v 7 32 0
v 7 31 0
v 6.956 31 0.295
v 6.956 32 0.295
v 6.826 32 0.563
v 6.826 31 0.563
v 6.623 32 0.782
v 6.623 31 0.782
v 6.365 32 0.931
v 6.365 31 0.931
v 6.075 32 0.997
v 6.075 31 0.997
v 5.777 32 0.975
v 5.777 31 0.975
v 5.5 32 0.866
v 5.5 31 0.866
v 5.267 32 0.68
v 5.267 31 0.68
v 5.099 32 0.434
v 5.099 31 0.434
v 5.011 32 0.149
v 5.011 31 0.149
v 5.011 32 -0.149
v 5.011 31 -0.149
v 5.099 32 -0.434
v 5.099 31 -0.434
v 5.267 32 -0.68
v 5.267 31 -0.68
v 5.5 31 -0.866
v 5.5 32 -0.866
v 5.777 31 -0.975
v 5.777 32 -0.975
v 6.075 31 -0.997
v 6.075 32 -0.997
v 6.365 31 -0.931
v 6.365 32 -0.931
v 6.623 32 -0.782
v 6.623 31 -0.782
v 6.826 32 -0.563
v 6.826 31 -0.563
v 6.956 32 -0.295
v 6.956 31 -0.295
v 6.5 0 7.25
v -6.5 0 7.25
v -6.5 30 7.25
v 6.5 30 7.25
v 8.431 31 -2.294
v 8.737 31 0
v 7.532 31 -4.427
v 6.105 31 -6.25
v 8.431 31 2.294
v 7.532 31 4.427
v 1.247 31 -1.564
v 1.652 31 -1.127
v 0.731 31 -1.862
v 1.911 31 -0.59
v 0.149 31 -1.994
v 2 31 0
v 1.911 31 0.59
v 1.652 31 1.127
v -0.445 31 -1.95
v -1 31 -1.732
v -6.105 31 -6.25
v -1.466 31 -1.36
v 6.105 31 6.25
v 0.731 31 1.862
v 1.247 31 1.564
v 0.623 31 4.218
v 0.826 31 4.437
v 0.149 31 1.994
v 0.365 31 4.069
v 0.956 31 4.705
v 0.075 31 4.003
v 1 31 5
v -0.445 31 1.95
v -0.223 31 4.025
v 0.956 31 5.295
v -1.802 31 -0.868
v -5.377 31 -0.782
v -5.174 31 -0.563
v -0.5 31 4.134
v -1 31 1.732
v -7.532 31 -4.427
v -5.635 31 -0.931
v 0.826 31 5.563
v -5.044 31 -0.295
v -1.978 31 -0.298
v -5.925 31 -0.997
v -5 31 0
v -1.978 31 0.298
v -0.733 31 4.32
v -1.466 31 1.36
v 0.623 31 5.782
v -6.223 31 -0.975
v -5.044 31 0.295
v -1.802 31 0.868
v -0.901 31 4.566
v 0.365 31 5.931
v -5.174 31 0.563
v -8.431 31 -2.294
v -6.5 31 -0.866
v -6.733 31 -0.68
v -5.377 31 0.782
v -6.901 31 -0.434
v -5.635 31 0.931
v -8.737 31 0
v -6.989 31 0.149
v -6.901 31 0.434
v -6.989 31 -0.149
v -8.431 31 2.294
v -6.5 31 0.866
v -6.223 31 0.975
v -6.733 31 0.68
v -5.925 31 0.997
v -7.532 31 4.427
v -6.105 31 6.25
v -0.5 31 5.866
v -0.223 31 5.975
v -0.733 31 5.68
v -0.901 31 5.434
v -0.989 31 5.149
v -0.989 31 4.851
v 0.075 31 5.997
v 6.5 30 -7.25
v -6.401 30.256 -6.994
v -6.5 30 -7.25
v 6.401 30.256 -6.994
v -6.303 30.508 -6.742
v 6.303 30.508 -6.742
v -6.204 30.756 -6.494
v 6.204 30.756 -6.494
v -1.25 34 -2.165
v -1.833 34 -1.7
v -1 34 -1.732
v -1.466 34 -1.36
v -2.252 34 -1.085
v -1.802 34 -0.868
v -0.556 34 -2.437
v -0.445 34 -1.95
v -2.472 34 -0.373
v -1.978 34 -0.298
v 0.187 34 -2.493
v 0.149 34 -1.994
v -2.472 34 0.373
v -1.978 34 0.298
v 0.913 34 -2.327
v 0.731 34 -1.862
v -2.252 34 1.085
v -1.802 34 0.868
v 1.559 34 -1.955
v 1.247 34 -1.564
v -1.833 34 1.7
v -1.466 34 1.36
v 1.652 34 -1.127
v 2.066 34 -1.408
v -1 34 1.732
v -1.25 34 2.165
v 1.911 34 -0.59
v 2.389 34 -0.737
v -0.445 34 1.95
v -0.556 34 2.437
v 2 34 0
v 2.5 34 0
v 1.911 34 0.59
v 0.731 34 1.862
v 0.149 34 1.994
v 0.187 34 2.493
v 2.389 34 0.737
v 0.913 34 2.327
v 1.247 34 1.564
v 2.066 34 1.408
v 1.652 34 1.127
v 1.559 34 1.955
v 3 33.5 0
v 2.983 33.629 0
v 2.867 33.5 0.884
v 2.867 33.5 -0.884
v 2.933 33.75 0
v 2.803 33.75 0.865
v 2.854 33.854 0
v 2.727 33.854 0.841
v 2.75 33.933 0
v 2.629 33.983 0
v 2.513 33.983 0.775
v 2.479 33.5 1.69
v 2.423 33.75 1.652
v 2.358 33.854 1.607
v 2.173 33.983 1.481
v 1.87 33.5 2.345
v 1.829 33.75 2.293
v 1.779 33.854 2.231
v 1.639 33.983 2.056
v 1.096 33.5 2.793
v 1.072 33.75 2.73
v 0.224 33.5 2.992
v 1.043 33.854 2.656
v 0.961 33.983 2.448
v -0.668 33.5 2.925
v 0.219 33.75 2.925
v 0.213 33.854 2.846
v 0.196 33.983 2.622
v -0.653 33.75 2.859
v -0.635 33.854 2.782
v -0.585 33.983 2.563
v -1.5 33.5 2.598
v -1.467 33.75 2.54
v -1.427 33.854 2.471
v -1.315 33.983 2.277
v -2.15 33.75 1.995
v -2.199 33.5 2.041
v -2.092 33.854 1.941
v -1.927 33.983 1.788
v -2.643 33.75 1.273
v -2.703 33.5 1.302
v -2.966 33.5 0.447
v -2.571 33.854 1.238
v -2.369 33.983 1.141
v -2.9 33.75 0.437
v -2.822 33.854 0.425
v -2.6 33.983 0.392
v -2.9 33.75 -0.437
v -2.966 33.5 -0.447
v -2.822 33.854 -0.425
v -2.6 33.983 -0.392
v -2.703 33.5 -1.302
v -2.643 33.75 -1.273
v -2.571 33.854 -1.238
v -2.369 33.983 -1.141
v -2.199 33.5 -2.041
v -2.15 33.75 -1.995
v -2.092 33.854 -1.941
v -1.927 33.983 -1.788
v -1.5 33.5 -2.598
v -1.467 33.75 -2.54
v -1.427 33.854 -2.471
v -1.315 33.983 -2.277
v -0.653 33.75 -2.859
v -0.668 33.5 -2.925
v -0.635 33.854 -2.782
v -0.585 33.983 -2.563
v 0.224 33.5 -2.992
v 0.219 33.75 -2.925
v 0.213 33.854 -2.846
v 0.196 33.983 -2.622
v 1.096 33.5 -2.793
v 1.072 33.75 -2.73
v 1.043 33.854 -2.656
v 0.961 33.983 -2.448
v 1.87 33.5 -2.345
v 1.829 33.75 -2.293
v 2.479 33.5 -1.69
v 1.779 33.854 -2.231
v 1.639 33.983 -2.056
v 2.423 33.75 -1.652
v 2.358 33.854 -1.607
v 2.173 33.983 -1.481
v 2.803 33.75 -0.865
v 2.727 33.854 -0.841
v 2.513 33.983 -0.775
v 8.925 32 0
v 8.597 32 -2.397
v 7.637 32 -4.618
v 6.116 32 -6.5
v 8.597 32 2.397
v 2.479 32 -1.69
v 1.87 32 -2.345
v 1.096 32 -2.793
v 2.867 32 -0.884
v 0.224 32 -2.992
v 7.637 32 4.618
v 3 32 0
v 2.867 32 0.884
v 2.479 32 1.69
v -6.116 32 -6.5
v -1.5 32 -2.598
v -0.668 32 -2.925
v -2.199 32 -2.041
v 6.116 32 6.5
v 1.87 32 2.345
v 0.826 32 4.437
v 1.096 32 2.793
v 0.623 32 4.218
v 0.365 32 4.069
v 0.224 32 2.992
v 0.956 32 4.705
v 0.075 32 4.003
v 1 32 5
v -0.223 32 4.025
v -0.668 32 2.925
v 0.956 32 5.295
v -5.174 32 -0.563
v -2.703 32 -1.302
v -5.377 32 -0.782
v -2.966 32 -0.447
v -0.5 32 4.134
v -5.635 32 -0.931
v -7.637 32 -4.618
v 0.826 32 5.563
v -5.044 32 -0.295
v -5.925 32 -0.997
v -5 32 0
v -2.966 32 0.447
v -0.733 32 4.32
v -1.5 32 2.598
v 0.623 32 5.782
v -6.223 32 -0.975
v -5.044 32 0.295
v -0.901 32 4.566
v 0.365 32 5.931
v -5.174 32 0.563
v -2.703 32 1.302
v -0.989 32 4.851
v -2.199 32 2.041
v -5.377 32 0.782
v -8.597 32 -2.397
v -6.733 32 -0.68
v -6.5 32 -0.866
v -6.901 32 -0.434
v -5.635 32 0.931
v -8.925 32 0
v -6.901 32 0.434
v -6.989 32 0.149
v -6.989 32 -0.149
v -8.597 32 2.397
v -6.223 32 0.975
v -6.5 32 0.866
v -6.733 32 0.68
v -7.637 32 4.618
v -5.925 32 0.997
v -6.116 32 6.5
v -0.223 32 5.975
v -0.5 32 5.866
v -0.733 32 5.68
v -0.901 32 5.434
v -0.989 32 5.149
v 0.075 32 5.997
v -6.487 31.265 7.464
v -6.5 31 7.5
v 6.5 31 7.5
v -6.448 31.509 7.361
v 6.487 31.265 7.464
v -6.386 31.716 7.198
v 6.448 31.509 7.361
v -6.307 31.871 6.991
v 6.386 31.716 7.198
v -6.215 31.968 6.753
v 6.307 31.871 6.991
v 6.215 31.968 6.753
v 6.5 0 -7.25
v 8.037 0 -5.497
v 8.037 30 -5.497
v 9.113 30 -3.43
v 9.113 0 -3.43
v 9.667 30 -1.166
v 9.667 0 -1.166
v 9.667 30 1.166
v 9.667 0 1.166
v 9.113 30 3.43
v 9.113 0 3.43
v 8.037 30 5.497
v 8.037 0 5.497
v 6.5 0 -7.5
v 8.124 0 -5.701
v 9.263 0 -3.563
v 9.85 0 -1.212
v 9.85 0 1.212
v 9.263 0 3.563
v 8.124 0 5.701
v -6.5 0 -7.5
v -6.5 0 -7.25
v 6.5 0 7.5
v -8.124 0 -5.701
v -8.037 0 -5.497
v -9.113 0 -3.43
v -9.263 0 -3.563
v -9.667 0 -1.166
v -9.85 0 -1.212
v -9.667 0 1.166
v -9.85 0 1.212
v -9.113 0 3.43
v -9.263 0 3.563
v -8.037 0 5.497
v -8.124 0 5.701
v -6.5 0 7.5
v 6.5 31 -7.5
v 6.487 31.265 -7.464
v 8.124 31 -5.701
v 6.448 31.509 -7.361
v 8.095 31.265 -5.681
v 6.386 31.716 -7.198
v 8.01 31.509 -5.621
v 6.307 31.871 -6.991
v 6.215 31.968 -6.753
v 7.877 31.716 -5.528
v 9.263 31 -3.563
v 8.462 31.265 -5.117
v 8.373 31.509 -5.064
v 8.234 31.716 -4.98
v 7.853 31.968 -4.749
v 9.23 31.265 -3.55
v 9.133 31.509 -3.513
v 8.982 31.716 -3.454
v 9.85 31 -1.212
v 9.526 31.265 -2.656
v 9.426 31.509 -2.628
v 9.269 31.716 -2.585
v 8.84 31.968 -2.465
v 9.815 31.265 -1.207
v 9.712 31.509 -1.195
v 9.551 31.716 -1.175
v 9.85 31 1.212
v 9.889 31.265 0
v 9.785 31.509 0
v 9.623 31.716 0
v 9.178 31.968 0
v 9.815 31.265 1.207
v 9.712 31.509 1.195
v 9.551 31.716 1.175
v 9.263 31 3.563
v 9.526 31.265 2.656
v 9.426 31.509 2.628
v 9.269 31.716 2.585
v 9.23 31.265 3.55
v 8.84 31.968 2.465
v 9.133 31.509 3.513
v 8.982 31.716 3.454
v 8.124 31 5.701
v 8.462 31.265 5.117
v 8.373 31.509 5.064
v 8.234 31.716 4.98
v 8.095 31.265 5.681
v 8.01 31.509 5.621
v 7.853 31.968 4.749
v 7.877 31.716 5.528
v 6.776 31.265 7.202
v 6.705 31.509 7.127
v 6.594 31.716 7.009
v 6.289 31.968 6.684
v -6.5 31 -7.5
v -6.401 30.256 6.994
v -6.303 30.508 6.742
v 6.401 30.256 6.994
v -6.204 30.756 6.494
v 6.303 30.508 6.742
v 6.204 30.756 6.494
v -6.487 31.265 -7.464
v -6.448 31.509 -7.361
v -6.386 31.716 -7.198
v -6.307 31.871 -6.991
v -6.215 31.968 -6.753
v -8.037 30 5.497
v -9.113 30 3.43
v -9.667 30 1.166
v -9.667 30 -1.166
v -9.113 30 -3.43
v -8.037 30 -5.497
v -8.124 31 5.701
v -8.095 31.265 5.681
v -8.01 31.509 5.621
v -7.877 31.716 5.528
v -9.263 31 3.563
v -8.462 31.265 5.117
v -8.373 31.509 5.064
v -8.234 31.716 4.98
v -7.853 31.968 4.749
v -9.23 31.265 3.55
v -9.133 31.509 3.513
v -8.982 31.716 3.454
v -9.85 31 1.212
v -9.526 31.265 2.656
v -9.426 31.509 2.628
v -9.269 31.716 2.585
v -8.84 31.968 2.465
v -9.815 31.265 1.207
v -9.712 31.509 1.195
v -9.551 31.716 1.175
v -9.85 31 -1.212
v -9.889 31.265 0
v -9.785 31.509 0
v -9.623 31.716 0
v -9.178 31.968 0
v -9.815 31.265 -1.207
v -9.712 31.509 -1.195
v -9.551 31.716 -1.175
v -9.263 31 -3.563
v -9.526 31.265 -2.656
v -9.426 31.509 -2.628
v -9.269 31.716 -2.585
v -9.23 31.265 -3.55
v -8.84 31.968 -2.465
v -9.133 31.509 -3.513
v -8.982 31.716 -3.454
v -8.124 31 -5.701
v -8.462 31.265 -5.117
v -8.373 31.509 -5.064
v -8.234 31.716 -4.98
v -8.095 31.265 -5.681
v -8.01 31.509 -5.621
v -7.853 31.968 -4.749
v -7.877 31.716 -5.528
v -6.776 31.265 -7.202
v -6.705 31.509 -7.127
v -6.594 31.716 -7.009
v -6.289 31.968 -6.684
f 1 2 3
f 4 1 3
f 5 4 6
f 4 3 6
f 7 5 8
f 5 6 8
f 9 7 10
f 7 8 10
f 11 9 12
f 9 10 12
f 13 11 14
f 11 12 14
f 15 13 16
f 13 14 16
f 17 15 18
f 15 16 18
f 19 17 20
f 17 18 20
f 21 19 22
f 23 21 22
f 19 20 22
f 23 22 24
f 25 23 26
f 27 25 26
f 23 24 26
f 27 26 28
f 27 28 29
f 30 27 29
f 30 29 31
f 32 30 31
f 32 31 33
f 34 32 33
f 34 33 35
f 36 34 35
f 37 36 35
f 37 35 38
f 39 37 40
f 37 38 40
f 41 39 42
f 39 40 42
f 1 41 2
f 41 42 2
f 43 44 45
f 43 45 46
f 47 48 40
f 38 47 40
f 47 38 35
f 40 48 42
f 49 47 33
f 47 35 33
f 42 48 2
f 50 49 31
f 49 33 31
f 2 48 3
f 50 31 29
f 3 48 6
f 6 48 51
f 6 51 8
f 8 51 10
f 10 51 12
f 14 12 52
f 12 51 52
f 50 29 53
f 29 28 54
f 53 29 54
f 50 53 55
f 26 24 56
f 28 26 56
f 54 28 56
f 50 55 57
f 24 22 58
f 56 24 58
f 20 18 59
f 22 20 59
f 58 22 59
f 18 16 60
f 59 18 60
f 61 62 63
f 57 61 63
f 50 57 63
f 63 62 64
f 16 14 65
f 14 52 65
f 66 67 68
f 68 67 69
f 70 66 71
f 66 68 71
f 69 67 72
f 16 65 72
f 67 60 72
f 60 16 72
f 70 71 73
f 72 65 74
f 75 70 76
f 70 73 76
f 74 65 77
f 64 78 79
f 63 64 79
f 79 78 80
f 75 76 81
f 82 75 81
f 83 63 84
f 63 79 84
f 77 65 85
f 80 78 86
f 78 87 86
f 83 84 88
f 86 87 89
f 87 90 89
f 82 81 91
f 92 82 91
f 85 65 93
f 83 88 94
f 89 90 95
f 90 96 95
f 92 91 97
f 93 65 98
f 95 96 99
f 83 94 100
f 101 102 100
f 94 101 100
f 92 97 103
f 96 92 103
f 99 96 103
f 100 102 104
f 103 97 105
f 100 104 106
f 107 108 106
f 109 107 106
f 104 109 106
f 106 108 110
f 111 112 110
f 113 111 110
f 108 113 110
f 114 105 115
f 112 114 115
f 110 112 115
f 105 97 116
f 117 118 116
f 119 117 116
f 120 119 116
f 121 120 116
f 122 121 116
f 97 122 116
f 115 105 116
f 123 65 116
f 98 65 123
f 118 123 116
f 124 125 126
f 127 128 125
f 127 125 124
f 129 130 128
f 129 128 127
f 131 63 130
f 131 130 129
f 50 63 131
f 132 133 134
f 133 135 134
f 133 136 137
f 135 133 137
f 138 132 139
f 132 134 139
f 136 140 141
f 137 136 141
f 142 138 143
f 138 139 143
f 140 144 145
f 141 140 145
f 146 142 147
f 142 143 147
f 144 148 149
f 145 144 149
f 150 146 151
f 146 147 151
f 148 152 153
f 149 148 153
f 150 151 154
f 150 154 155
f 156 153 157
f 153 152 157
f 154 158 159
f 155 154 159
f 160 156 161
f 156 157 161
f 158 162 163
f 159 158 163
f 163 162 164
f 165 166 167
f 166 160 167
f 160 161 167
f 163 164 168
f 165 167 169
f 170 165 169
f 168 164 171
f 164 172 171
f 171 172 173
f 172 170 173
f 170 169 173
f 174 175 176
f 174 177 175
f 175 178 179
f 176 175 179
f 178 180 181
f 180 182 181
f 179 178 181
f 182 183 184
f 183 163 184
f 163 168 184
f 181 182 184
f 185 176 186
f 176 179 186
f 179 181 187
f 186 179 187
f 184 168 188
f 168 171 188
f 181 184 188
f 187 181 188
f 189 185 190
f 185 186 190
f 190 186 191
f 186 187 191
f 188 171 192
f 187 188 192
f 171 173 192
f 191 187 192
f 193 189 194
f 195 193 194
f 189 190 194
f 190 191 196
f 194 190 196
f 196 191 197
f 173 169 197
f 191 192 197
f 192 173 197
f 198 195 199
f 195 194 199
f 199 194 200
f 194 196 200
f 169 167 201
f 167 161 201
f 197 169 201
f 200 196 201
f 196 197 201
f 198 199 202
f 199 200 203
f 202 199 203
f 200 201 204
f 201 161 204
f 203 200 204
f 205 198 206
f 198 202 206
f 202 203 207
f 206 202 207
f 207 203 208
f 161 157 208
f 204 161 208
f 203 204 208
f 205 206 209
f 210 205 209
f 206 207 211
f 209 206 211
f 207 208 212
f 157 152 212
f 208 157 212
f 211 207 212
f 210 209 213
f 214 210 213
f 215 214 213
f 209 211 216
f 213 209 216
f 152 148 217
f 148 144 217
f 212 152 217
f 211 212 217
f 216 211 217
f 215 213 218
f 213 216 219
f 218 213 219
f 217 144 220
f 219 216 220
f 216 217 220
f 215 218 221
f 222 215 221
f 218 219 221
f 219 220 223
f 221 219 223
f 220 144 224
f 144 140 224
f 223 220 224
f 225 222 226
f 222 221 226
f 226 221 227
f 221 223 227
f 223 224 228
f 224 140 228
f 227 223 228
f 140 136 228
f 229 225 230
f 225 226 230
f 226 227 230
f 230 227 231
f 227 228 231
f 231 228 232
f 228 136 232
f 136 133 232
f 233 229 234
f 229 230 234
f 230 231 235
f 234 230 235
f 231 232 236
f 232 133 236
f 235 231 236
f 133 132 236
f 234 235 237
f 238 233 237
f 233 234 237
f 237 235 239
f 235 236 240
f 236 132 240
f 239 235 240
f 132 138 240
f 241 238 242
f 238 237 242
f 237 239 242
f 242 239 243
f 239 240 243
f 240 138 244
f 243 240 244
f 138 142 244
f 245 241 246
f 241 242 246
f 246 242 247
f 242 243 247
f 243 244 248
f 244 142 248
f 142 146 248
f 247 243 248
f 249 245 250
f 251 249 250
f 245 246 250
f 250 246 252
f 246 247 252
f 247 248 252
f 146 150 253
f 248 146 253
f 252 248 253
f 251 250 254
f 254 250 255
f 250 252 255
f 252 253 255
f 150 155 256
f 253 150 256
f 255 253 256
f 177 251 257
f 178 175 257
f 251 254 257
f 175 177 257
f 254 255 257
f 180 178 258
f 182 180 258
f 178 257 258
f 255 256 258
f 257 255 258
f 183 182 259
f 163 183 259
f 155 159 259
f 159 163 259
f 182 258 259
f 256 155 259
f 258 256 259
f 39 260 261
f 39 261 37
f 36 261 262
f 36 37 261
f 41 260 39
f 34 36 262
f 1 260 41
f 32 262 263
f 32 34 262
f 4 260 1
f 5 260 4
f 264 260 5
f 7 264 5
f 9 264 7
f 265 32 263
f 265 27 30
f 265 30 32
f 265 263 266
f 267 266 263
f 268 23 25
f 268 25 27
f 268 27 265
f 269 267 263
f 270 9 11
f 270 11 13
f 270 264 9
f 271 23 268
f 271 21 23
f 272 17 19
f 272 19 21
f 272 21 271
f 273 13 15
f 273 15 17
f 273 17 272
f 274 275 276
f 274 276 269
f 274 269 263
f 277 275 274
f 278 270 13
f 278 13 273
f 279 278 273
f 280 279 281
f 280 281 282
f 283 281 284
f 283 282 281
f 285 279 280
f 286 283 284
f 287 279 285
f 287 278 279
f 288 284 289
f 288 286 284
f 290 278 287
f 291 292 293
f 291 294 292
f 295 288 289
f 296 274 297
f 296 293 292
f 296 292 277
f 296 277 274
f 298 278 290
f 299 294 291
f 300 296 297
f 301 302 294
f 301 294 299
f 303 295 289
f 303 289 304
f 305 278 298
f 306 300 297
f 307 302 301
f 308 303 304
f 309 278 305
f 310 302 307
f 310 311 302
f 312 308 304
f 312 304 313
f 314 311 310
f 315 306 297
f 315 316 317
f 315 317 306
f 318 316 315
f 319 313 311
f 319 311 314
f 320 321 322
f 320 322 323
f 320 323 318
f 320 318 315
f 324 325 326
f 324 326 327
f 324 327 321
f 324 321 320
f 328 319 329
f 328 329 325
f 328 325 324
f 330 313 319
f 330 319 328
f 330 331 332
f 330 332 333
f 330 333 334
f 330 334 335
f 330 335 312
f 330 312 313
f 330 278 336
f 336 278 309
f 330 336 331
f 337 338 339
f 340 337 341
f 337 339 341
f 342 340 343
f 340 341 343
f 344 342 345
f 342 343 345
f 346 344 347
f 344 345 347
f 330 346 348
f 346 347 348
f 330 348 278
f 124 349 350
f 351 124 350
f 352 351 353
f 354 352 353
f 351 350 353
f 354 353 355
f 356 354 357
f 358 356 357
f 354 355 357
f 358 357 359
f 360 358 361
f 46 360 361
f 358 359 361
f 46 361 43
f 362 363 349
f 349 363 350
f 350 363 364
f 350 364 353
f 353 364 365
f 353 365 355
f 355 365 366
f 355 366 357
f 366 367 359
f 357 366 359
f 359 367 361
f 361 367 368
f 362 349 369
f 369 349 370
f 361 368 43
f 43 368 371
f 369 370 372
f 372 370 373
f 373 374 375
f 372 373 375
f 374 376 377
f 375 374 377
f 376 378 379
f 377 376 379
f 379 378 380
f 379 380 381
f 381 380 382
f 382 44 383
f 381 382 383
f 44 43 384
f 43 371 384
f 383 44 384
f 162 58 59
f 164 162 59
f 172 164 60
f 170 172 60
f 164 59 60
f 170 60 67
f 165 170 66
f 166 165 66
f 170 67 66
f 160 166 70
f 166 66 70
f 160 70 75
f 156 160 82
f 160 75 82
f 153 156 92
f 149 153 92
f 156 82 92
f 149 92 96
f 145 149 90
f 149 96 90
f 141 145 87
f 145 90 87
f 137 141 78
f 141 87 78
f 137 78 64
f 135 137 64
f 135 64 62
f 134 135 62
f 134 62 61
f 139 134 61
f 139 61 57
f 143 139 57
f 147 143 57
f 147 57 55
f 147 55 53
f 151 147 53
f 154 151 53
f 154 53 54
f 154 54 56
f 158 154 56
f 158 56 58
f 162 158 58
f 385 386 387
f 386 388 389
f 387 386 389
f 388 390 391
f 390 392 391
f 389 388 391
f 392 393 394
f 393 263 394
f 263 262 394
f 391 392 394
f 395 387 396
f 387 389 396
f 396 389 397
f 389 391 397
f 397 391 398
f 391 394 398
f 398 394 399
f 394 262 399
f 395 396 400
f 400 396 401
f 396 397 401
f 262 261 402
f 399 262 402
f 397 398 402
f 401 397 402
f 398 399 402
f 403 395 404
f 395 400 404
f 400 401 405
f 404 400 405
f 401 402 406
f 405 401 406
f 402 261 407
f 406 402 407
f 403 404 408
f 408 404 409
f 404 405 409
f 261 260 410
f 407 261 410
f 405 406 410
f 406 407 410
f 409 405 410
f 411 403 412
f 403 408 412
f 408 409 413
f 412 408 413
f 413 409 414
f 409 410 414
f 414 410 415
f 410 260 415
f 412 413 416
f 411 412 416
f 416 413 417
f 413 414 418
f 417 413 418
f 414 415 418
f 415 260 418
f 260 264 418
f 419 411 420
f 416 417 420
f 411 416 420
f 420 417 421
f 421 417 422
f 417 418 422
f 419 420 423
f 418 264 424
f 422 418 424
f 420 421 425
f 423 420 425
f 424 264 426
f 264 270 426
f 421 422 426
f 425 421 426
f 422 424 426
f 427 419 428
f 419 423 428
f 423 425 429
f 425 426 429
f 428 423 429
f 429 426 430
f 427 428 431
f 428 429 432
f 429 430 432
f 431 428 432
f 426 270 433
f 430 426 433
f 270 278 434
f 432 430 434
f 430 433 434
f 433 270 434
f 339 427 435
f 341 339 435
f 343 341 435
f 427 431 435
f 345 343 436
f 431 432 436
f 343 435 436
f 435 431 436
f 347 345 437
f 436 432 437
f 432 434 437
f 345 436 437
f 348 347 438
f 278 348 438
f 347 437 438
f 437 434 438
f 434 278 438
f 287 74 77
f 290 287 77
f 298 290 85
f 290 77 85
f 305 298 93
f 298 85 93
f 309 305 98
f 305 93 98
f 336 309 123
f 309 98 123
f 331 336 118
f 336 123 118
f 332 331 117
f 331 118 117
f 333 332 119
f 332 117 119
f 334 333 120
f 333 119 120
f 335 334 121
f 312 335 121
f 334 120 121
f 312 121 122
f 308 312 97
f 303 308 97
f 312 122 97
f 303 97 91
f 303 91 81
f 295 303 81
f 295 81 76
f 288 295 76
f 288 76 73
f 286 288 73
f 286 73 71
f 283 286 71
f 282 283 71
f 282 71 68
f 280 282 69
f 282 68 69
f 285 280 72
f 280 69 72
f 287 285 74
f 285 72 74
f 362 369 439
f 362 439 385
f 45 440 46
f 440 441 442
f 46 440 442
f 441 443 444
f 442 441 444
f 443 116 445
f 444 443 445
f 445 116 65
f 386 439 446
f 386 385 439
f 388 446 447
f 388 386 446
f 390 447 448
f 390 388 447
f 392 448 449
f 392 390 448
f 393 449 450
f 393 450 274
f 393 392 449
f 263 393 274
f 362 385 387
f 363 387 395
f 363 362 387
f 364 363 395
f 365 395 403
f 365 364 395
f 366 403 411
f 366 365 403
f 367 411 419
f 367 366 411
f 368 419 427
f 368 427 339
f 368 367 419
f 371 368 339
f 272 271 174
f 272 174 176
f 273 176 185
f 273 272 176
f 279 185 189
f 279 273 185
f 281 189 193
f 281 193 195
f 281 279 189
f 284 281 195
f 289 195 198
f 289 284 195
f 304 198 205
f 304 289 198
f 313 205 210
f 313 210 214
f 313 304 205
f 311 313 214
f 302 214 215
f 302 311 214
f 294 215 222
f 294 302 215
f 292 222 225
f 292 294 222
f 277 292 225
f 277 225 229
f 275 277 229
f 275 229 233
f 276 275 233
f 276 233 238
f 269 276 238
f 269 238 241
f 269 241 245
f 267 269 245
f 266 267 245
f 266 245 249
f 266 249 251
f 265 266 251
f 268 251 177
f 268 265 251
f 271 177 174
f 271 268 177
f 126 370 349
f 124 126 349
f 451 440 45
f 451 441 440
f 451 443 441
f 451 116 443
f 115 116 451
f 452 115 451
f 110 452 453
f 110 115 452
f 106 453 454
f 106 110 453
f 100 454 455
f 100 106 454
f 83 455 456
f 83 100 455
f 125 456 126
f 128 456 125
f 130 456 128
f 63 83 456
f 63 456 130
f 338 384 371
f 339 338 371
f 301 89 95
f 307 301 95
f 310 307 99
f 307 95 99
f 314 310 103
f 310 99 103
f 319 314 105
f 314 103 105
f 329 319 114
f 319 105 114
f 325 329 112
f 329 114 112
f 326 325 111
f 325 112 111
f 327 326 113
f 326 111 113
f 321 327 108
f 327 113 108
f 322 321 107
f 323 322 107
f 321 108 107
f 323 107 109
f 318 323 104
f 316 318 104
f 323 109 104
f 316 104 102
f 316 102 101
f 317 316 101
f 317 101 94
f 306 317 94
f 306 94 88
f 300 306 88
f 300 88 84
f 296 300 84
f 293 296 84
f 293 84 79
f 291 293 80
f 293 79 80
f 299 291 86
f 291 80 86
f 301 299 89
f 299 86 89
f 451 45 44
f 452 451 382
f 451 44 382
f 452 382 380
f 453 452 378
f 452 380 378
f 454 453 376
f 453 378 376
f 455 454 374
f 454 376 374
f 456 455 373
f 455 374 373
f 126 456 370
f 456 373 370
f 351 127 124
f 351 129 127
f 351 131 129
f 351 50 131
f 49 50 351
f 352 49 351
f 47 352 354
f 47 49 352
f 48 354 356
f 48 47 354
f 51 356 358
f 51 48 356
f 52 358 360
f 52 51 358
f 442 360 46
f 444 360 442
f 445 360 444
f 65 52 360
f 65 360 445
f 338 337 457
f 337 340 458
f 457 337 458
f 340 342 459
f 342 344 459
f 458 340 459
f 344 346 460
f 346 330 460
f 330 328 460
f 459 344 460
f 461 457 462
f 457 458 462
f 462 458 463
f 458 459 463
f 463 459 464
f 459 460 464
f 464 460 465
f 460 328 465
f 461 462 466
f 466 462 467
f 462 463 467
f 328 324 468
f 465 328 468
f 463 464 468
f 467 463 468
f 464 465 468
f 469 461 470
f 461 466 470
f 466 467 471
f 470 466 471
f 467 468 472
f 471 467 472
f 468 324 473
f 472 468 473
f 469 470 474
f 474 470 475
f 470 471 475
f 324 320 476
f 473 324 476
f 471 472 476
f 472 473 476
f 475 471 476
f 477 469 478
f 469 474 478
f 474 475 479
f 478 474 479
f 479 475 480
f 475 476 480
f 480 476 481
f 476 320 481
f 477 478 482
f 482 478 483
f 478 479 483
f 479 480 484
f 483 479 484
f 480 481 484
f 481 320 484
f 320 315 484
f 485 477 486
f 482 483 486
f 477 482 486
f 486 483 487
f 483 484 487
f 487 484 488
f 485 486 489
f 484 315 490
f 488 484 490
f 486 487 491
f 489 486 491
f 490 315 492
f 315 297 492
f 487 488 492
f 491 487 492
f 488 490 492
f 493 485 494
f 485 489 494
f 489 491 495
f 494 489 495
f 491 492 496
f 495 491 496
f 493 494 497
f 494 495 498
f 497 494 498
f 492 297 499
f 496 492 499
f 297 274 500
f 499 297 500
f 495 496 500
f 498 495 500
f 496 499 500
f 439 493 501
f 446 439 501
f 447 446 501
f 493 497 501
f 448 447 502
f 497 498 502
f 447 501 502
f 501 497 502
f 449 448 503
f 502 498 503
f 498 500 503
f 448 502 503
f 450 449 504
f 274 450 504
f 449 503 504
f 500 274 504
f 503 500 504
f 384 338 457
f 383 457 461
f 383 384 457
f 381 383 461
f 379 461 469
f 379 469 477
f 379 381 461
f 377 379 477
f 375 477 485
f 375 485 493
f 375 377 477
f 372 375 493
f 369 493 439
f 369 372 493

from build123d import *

# Parameters (mm, degrees)
SKETCH251_AS_DRAWN_R                 = 1
EXTRUDE052_DEPTH                     = 1
EXTRUDE052_ONTO_SKETCH251_ROLL_ANGLE = 90
SKETCH249_AS_DRAWN_R                 = 2
EXTRUDE051_DEPTH                     = 1
EXTRUDE051_ONTO_SKETCH249_ROLL_ANGLE = 90
EXTRUDE047_DEPTH                     = 31
EXTRUDE047_ONTO_SKETCH246_ROLL_ANGLE = 90
CHAMFER_SIZE                         = 1
EXTRUDE046_DEPTH                     = 32
EXTRUDE046_ONTO_SKETCH244_ROLL_ANGLE = 90
FILLET_R                             = 1
SKETCH248_AS_DRAWN_R                 = 2
EXTRUDE050_DEPTH                     = 2
EXTRUDE050_ONTO_SKETCH248_ROLL_ANGLE = 90
SKETCH247_AS_DRAWN_R                 = 3
EXTRUDE049_DEPTH                     = 2
EXTRUDE049_ONTO_SKETCH247_ROLL_ANGLE = 90
FILLET001_R                          = 0.5


with BuildPart() as extrude052:
    # Sketch251 as drawn → Extrude052 (new)
    with BuildSketch(Plane.XY):
        with Locations((4.5, 0)):
            Circle(SKETCH251_AS_DRAWN_R)
        with Locations((-7.5, 0)):
            Circle(SKETCH251_AS_DRAWN_R)
        with Locations((-1.5, 5)):
            Circle(SKETCH251_AS_DRAWN_R)
    extrude(amount=-EXTRUDE052_DEPTH)


with BuildPart() as extrude052_1:
    # Extrude052 onto Sketch251 roll: moved
    add(extrude052.part.rotate(Axis((0, 0, 0), (1, 0, 0)), EXTRUDE052_ONTO_SKETCH251_ROLL_ANGLE))


with BuildPart() as extrude052_2:
    # Extrude052 onto Sketch251 placement: moved
    add(extrude052_1.part.moved(Location((1.5, 31, 0))))


with BuildPart() as extrude051:
    # Sketch249 as drawn → Extrude051 (new)
    with BuildSketch(Plane.XY):
        Circle(SKETCH249_AS_DRAWN_R)
    extrude(amount=-EXTRUDE051_DEPTH)


with BuildPart() as extrude051_1:
    # Extrude051 onto Sketch249 roll: moved
    add(extrude051.part.rotate(Axis((0, 0, 0), (1, 0, 0)), EXTRUDE051_ONTO_SKETCH249_ROLL_ANGLE))


with BuildPart() as extrude051_2:
    # Extrude051 onto Sketch249 placement: moved
    add(extrude051_1.part.moved(Location((0, 31, 0))))


with BuildPart() as chamfer_body:
    # Sketch246 as drawn → Extrude047 (new)
    with BuildSketch(Plane.XY):
        with BuildLine():
            Line((-6.5, 7.250002), (6.499997, 7.250002))
            ThreePointArc((6.499997, -7.250002), (9.737171, 0), (6.499997, 7.250002))
            Line((-6.5, -7.250002), (6.499997, -7.250002))
            ThreePointArc((-6.5, 7.250002), (-9.737172, 0), (-6.5, -7.250002))
        make_face()
    extrude(amount=-EXTRUDE047_DEPTH)


with BuildPart() as chamfer_body_1:
    # Extrude047 onto Sketch246 roll: moved
    add(chamfer_body.part.rotate(Axis((0, 0, 0), (1, 0, 0)), EXTRUDE047_ONTO_SKETCH246_ROLL_ANGLE))


with BuildPart() as chamfer_body_2:
    # Extrude047 onto Sketch246 placement: moved
    add(chamfer_body_1.part)

    # Chamfer
    chamfer_edges = [chamfer_body_2.edges().sort_by_distance(p)[0] for p in [
        (-1e-06, 31, 7.250002),
        (9.737171, 31, 0),
        (-1e-06, 31, -7.250002),
        (-9.737172, 31, 0),
    ]]
    chamfer(chamfer_edges, length=CHAMFER_SIZE)


with BuildPart() as cut032:
    # Sketch244 as drawn → Extrude046 (new)
    with BuildSketch(Plane.XY):
        with BuildLine():
            Line((-6.5, 7.499998), (6.499997, 7.499998))
            ThreePointArc((6.499997, -7.499998), (9.924714, 0), (6.499997, 7.499998))
            Line((-6.5, -7.499998), (6.499997, -7.499998))
            ThreePointArc((-6.5, 7.499998), (-9.924715, 0), (-6.5, -7.499998))
        make_face()
    extrude(amount=-EXTRUDE046_DEPTH)


with BuildPart() as cut032_1:
    # Extrude046 onto Sketch244 roll: moved
    add(cut032.part.rotate(Axis((0, 0, 0), (1, 0, 0)), EXTRUDE046_ONTO_SKETCH244_ROLL_ANGLE))


with BuildPart() as cut032_2:
    # Extrude046 onto Sketch244 placement: moved
    add(cut032_1.part)

    # Fillet
    fillet_edges = [cut032_2.edges().sort_by_distance(p)[0] for p in [
        (-1e-06, 32, 7.499998),
        (9.924714, 32, 0),
        (-1e-06, 32, -7.499998),
        (-9.924715, 32, 0),
    ]]
    fillet(fillet_edges, radius=FILLET_R)

    # Cut029: cut Chamfer body
    add(chamfer_body_2.part, mode=Mode.SUBTRACT)

    # Cut031: cut Extrude051
    add(extrude051_2.part, mode=Mode.SUBTRACT)

    # Cut032: cut Extrude052
    add(extrude052_2.part, mode=Mode.SUBTRACT)


with BuildPart() as extrude050:
    # Sketch248 as drawn → Extrude050 (new)
    with BuildSketch(Plane.XY):
        Circle(SKETCH248_AS_DRAWN_R)
    extrude(amount=-EXTRUDE050_DEPTH)


with BuildPart() as extrude050_1:
    # Extrude050 onto Sketch248 roll: moved
    add(extrude050.part.rotate(Axis((0, 0, 0), (1, 0, 0)), EXTRUDE050_ONTO_SKETCH248_ROLL_ANGLE))


with BuildPart() as extrude050_2:
    # Extrude050 onto Sketch248 placement: moved
    add(extrude050_1.part.moved(Location((0, 34, 0))))


with BuildPart() as extrude050_3:
    # Extrude050 placement: moved
    add(extrude050_2.part.moved(Location((0, -2, 0))))


with BuildPart() as fusion017:
    # Sketch247 as drawn → Extrude049 (new)
    with BuildSketch(Plane.XY):
        Circle(SKETCH247_AS_DRAWN_R)
    extrude(amount=-EXTRUDE049_DEPTH)


with BuildPart() as fusion017_1:
    # Extrude049 onto Sketch247 roll: moved
    add(fusion017.part.rotate(Axis((0, 0, 0), (1, 0, 0)), EXTRUDE049_ONTO_SKETCH247_ROLL_ANGLE))


with BuildPart() as fusion017_2:
    # Extrude049 onto Sketch247 placement: moved
    add(fusion017_1.part.moved(Location((0, 32, 0))))

    # Fillet001
    fillet001_edges = [fusion017_2.edges().sort_by_distance(p)[0] for p in [
        (-3, 34, 0),
    ]]
    fillet(fillet001_edges, radius=FILLET001_R)

    # Cut030: cut Extrude050
    add(extrude050_3.part, mode=Mode.SUBTRACT)

    # Fusion017: union Cut032
    add(cut032_2.part)


solid = fusion017_2.part
